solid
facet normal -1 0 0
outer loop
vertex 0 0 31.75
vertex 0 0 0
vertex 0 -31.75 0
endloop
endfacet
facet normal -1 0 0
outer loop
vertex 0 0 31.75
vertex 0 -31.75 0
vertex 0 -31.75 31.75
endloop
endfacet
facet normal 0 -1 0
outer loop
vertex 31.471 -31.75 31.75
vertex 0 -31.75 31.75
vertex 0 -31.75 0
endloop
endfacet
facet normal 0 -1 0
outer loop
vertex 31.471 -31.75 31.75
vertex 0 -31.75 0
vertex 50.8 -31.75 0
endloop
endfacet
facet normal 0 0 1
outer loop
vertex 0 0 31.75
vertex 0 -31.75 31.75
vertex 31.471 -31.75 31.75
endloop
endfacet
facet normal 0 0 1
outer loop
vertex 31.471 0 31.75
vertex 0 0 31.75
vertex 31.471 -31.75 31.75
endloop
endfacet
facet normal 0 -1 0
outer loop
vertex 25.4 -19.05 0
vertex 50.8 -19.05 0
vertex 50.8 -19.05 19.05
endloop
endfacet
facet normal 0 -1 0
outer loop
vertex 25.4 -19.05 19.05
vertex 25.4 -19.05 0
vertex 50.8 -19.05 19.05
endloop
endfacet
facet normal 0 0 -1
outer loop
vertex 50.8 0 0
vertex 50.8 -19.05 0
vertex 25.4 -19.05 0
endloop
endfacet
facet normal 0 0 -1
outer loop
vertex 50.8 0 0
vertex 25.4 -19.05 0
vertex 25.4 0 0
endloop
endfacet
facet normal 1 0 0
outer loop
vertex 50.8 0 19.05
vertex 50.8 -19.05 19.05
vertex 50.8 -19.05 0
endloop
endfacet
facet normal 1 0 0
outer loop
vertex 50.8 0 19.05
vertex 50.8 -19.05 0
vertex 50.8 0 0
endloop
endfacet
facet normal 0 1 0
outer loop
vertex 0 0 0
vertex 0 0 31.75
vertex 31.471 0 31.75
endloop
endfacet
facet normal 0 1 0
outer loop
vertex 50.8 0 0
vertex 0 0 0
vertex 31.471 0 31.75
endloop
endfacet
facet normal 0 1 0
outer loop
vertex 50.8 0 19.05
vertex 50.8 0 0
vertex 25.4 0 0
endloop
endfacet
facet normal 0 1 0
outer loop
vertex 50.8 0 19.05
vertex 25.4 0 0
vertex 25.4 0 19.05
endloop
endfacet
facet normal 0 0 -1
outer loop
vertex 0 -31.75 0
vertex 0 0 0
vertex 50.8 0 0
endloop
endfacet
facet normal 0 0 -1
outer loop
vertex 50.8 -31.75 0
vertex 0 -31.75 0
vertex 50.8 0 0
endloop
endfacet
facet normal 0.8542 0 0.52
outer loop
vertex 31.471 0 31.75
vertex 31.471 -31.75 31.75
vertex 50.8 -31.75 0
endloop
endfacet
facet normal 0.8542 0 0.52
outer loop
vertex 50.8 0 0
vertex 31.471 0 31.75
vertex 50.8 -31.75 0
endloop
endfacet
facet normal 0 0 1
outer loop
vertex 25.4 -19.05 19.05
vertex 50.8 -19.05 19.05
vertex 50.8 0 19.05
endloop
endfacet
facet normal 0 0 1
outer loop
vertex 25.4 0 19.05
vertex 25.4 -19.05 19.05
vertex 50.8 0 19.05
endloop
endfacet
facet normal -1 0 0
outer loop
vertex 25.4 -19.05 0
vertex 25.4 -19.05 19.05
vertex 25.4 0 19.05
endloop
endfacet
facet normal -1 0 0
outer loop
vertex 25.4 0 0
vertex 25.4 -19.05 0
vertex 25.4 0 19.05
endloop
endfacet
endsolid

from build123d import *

# Parameters (mm, degrees)
F0_W     = 50.8
F0_H     = 31.75
F1_DEPTH = 31.75
F4_DEPTH = 31.75
F2_W     = 19.05
F2_H     = 19.05
F5_DEPTH = 25.4


with BuildPart() as f1:
    # F0 (on Front) → F1 (new body)
    with BuildSketch(Plane.XZ):
        with Locations((25.4, 15.875)):
            Rectangle(F0_W, F0_H)
    extrude(amount=F1_DEPTH)

    # F3 (on face) → F4 (cut)
    with BuildSketch(Plane.XZ.offset(31.75)):
        Polygon((31.470876, 31.75), (50.8, 0), (50.8, 31.75), align=None)
    extrude(amount=-F4_DEPTH, mode=Mode.SUBTRACT)


with BuildPart() as f5:
    # F2 (on face) → F5 (new body)
    with BuildSketch(Plane.YZ.offset(50.8)):
        with Locations((-9.525, 9.525)):
            Rectangle(F2_W, F2_H)
    extrude(amount=-F5_DEPTH)


solid = Compound([f1.part, f5.part])
